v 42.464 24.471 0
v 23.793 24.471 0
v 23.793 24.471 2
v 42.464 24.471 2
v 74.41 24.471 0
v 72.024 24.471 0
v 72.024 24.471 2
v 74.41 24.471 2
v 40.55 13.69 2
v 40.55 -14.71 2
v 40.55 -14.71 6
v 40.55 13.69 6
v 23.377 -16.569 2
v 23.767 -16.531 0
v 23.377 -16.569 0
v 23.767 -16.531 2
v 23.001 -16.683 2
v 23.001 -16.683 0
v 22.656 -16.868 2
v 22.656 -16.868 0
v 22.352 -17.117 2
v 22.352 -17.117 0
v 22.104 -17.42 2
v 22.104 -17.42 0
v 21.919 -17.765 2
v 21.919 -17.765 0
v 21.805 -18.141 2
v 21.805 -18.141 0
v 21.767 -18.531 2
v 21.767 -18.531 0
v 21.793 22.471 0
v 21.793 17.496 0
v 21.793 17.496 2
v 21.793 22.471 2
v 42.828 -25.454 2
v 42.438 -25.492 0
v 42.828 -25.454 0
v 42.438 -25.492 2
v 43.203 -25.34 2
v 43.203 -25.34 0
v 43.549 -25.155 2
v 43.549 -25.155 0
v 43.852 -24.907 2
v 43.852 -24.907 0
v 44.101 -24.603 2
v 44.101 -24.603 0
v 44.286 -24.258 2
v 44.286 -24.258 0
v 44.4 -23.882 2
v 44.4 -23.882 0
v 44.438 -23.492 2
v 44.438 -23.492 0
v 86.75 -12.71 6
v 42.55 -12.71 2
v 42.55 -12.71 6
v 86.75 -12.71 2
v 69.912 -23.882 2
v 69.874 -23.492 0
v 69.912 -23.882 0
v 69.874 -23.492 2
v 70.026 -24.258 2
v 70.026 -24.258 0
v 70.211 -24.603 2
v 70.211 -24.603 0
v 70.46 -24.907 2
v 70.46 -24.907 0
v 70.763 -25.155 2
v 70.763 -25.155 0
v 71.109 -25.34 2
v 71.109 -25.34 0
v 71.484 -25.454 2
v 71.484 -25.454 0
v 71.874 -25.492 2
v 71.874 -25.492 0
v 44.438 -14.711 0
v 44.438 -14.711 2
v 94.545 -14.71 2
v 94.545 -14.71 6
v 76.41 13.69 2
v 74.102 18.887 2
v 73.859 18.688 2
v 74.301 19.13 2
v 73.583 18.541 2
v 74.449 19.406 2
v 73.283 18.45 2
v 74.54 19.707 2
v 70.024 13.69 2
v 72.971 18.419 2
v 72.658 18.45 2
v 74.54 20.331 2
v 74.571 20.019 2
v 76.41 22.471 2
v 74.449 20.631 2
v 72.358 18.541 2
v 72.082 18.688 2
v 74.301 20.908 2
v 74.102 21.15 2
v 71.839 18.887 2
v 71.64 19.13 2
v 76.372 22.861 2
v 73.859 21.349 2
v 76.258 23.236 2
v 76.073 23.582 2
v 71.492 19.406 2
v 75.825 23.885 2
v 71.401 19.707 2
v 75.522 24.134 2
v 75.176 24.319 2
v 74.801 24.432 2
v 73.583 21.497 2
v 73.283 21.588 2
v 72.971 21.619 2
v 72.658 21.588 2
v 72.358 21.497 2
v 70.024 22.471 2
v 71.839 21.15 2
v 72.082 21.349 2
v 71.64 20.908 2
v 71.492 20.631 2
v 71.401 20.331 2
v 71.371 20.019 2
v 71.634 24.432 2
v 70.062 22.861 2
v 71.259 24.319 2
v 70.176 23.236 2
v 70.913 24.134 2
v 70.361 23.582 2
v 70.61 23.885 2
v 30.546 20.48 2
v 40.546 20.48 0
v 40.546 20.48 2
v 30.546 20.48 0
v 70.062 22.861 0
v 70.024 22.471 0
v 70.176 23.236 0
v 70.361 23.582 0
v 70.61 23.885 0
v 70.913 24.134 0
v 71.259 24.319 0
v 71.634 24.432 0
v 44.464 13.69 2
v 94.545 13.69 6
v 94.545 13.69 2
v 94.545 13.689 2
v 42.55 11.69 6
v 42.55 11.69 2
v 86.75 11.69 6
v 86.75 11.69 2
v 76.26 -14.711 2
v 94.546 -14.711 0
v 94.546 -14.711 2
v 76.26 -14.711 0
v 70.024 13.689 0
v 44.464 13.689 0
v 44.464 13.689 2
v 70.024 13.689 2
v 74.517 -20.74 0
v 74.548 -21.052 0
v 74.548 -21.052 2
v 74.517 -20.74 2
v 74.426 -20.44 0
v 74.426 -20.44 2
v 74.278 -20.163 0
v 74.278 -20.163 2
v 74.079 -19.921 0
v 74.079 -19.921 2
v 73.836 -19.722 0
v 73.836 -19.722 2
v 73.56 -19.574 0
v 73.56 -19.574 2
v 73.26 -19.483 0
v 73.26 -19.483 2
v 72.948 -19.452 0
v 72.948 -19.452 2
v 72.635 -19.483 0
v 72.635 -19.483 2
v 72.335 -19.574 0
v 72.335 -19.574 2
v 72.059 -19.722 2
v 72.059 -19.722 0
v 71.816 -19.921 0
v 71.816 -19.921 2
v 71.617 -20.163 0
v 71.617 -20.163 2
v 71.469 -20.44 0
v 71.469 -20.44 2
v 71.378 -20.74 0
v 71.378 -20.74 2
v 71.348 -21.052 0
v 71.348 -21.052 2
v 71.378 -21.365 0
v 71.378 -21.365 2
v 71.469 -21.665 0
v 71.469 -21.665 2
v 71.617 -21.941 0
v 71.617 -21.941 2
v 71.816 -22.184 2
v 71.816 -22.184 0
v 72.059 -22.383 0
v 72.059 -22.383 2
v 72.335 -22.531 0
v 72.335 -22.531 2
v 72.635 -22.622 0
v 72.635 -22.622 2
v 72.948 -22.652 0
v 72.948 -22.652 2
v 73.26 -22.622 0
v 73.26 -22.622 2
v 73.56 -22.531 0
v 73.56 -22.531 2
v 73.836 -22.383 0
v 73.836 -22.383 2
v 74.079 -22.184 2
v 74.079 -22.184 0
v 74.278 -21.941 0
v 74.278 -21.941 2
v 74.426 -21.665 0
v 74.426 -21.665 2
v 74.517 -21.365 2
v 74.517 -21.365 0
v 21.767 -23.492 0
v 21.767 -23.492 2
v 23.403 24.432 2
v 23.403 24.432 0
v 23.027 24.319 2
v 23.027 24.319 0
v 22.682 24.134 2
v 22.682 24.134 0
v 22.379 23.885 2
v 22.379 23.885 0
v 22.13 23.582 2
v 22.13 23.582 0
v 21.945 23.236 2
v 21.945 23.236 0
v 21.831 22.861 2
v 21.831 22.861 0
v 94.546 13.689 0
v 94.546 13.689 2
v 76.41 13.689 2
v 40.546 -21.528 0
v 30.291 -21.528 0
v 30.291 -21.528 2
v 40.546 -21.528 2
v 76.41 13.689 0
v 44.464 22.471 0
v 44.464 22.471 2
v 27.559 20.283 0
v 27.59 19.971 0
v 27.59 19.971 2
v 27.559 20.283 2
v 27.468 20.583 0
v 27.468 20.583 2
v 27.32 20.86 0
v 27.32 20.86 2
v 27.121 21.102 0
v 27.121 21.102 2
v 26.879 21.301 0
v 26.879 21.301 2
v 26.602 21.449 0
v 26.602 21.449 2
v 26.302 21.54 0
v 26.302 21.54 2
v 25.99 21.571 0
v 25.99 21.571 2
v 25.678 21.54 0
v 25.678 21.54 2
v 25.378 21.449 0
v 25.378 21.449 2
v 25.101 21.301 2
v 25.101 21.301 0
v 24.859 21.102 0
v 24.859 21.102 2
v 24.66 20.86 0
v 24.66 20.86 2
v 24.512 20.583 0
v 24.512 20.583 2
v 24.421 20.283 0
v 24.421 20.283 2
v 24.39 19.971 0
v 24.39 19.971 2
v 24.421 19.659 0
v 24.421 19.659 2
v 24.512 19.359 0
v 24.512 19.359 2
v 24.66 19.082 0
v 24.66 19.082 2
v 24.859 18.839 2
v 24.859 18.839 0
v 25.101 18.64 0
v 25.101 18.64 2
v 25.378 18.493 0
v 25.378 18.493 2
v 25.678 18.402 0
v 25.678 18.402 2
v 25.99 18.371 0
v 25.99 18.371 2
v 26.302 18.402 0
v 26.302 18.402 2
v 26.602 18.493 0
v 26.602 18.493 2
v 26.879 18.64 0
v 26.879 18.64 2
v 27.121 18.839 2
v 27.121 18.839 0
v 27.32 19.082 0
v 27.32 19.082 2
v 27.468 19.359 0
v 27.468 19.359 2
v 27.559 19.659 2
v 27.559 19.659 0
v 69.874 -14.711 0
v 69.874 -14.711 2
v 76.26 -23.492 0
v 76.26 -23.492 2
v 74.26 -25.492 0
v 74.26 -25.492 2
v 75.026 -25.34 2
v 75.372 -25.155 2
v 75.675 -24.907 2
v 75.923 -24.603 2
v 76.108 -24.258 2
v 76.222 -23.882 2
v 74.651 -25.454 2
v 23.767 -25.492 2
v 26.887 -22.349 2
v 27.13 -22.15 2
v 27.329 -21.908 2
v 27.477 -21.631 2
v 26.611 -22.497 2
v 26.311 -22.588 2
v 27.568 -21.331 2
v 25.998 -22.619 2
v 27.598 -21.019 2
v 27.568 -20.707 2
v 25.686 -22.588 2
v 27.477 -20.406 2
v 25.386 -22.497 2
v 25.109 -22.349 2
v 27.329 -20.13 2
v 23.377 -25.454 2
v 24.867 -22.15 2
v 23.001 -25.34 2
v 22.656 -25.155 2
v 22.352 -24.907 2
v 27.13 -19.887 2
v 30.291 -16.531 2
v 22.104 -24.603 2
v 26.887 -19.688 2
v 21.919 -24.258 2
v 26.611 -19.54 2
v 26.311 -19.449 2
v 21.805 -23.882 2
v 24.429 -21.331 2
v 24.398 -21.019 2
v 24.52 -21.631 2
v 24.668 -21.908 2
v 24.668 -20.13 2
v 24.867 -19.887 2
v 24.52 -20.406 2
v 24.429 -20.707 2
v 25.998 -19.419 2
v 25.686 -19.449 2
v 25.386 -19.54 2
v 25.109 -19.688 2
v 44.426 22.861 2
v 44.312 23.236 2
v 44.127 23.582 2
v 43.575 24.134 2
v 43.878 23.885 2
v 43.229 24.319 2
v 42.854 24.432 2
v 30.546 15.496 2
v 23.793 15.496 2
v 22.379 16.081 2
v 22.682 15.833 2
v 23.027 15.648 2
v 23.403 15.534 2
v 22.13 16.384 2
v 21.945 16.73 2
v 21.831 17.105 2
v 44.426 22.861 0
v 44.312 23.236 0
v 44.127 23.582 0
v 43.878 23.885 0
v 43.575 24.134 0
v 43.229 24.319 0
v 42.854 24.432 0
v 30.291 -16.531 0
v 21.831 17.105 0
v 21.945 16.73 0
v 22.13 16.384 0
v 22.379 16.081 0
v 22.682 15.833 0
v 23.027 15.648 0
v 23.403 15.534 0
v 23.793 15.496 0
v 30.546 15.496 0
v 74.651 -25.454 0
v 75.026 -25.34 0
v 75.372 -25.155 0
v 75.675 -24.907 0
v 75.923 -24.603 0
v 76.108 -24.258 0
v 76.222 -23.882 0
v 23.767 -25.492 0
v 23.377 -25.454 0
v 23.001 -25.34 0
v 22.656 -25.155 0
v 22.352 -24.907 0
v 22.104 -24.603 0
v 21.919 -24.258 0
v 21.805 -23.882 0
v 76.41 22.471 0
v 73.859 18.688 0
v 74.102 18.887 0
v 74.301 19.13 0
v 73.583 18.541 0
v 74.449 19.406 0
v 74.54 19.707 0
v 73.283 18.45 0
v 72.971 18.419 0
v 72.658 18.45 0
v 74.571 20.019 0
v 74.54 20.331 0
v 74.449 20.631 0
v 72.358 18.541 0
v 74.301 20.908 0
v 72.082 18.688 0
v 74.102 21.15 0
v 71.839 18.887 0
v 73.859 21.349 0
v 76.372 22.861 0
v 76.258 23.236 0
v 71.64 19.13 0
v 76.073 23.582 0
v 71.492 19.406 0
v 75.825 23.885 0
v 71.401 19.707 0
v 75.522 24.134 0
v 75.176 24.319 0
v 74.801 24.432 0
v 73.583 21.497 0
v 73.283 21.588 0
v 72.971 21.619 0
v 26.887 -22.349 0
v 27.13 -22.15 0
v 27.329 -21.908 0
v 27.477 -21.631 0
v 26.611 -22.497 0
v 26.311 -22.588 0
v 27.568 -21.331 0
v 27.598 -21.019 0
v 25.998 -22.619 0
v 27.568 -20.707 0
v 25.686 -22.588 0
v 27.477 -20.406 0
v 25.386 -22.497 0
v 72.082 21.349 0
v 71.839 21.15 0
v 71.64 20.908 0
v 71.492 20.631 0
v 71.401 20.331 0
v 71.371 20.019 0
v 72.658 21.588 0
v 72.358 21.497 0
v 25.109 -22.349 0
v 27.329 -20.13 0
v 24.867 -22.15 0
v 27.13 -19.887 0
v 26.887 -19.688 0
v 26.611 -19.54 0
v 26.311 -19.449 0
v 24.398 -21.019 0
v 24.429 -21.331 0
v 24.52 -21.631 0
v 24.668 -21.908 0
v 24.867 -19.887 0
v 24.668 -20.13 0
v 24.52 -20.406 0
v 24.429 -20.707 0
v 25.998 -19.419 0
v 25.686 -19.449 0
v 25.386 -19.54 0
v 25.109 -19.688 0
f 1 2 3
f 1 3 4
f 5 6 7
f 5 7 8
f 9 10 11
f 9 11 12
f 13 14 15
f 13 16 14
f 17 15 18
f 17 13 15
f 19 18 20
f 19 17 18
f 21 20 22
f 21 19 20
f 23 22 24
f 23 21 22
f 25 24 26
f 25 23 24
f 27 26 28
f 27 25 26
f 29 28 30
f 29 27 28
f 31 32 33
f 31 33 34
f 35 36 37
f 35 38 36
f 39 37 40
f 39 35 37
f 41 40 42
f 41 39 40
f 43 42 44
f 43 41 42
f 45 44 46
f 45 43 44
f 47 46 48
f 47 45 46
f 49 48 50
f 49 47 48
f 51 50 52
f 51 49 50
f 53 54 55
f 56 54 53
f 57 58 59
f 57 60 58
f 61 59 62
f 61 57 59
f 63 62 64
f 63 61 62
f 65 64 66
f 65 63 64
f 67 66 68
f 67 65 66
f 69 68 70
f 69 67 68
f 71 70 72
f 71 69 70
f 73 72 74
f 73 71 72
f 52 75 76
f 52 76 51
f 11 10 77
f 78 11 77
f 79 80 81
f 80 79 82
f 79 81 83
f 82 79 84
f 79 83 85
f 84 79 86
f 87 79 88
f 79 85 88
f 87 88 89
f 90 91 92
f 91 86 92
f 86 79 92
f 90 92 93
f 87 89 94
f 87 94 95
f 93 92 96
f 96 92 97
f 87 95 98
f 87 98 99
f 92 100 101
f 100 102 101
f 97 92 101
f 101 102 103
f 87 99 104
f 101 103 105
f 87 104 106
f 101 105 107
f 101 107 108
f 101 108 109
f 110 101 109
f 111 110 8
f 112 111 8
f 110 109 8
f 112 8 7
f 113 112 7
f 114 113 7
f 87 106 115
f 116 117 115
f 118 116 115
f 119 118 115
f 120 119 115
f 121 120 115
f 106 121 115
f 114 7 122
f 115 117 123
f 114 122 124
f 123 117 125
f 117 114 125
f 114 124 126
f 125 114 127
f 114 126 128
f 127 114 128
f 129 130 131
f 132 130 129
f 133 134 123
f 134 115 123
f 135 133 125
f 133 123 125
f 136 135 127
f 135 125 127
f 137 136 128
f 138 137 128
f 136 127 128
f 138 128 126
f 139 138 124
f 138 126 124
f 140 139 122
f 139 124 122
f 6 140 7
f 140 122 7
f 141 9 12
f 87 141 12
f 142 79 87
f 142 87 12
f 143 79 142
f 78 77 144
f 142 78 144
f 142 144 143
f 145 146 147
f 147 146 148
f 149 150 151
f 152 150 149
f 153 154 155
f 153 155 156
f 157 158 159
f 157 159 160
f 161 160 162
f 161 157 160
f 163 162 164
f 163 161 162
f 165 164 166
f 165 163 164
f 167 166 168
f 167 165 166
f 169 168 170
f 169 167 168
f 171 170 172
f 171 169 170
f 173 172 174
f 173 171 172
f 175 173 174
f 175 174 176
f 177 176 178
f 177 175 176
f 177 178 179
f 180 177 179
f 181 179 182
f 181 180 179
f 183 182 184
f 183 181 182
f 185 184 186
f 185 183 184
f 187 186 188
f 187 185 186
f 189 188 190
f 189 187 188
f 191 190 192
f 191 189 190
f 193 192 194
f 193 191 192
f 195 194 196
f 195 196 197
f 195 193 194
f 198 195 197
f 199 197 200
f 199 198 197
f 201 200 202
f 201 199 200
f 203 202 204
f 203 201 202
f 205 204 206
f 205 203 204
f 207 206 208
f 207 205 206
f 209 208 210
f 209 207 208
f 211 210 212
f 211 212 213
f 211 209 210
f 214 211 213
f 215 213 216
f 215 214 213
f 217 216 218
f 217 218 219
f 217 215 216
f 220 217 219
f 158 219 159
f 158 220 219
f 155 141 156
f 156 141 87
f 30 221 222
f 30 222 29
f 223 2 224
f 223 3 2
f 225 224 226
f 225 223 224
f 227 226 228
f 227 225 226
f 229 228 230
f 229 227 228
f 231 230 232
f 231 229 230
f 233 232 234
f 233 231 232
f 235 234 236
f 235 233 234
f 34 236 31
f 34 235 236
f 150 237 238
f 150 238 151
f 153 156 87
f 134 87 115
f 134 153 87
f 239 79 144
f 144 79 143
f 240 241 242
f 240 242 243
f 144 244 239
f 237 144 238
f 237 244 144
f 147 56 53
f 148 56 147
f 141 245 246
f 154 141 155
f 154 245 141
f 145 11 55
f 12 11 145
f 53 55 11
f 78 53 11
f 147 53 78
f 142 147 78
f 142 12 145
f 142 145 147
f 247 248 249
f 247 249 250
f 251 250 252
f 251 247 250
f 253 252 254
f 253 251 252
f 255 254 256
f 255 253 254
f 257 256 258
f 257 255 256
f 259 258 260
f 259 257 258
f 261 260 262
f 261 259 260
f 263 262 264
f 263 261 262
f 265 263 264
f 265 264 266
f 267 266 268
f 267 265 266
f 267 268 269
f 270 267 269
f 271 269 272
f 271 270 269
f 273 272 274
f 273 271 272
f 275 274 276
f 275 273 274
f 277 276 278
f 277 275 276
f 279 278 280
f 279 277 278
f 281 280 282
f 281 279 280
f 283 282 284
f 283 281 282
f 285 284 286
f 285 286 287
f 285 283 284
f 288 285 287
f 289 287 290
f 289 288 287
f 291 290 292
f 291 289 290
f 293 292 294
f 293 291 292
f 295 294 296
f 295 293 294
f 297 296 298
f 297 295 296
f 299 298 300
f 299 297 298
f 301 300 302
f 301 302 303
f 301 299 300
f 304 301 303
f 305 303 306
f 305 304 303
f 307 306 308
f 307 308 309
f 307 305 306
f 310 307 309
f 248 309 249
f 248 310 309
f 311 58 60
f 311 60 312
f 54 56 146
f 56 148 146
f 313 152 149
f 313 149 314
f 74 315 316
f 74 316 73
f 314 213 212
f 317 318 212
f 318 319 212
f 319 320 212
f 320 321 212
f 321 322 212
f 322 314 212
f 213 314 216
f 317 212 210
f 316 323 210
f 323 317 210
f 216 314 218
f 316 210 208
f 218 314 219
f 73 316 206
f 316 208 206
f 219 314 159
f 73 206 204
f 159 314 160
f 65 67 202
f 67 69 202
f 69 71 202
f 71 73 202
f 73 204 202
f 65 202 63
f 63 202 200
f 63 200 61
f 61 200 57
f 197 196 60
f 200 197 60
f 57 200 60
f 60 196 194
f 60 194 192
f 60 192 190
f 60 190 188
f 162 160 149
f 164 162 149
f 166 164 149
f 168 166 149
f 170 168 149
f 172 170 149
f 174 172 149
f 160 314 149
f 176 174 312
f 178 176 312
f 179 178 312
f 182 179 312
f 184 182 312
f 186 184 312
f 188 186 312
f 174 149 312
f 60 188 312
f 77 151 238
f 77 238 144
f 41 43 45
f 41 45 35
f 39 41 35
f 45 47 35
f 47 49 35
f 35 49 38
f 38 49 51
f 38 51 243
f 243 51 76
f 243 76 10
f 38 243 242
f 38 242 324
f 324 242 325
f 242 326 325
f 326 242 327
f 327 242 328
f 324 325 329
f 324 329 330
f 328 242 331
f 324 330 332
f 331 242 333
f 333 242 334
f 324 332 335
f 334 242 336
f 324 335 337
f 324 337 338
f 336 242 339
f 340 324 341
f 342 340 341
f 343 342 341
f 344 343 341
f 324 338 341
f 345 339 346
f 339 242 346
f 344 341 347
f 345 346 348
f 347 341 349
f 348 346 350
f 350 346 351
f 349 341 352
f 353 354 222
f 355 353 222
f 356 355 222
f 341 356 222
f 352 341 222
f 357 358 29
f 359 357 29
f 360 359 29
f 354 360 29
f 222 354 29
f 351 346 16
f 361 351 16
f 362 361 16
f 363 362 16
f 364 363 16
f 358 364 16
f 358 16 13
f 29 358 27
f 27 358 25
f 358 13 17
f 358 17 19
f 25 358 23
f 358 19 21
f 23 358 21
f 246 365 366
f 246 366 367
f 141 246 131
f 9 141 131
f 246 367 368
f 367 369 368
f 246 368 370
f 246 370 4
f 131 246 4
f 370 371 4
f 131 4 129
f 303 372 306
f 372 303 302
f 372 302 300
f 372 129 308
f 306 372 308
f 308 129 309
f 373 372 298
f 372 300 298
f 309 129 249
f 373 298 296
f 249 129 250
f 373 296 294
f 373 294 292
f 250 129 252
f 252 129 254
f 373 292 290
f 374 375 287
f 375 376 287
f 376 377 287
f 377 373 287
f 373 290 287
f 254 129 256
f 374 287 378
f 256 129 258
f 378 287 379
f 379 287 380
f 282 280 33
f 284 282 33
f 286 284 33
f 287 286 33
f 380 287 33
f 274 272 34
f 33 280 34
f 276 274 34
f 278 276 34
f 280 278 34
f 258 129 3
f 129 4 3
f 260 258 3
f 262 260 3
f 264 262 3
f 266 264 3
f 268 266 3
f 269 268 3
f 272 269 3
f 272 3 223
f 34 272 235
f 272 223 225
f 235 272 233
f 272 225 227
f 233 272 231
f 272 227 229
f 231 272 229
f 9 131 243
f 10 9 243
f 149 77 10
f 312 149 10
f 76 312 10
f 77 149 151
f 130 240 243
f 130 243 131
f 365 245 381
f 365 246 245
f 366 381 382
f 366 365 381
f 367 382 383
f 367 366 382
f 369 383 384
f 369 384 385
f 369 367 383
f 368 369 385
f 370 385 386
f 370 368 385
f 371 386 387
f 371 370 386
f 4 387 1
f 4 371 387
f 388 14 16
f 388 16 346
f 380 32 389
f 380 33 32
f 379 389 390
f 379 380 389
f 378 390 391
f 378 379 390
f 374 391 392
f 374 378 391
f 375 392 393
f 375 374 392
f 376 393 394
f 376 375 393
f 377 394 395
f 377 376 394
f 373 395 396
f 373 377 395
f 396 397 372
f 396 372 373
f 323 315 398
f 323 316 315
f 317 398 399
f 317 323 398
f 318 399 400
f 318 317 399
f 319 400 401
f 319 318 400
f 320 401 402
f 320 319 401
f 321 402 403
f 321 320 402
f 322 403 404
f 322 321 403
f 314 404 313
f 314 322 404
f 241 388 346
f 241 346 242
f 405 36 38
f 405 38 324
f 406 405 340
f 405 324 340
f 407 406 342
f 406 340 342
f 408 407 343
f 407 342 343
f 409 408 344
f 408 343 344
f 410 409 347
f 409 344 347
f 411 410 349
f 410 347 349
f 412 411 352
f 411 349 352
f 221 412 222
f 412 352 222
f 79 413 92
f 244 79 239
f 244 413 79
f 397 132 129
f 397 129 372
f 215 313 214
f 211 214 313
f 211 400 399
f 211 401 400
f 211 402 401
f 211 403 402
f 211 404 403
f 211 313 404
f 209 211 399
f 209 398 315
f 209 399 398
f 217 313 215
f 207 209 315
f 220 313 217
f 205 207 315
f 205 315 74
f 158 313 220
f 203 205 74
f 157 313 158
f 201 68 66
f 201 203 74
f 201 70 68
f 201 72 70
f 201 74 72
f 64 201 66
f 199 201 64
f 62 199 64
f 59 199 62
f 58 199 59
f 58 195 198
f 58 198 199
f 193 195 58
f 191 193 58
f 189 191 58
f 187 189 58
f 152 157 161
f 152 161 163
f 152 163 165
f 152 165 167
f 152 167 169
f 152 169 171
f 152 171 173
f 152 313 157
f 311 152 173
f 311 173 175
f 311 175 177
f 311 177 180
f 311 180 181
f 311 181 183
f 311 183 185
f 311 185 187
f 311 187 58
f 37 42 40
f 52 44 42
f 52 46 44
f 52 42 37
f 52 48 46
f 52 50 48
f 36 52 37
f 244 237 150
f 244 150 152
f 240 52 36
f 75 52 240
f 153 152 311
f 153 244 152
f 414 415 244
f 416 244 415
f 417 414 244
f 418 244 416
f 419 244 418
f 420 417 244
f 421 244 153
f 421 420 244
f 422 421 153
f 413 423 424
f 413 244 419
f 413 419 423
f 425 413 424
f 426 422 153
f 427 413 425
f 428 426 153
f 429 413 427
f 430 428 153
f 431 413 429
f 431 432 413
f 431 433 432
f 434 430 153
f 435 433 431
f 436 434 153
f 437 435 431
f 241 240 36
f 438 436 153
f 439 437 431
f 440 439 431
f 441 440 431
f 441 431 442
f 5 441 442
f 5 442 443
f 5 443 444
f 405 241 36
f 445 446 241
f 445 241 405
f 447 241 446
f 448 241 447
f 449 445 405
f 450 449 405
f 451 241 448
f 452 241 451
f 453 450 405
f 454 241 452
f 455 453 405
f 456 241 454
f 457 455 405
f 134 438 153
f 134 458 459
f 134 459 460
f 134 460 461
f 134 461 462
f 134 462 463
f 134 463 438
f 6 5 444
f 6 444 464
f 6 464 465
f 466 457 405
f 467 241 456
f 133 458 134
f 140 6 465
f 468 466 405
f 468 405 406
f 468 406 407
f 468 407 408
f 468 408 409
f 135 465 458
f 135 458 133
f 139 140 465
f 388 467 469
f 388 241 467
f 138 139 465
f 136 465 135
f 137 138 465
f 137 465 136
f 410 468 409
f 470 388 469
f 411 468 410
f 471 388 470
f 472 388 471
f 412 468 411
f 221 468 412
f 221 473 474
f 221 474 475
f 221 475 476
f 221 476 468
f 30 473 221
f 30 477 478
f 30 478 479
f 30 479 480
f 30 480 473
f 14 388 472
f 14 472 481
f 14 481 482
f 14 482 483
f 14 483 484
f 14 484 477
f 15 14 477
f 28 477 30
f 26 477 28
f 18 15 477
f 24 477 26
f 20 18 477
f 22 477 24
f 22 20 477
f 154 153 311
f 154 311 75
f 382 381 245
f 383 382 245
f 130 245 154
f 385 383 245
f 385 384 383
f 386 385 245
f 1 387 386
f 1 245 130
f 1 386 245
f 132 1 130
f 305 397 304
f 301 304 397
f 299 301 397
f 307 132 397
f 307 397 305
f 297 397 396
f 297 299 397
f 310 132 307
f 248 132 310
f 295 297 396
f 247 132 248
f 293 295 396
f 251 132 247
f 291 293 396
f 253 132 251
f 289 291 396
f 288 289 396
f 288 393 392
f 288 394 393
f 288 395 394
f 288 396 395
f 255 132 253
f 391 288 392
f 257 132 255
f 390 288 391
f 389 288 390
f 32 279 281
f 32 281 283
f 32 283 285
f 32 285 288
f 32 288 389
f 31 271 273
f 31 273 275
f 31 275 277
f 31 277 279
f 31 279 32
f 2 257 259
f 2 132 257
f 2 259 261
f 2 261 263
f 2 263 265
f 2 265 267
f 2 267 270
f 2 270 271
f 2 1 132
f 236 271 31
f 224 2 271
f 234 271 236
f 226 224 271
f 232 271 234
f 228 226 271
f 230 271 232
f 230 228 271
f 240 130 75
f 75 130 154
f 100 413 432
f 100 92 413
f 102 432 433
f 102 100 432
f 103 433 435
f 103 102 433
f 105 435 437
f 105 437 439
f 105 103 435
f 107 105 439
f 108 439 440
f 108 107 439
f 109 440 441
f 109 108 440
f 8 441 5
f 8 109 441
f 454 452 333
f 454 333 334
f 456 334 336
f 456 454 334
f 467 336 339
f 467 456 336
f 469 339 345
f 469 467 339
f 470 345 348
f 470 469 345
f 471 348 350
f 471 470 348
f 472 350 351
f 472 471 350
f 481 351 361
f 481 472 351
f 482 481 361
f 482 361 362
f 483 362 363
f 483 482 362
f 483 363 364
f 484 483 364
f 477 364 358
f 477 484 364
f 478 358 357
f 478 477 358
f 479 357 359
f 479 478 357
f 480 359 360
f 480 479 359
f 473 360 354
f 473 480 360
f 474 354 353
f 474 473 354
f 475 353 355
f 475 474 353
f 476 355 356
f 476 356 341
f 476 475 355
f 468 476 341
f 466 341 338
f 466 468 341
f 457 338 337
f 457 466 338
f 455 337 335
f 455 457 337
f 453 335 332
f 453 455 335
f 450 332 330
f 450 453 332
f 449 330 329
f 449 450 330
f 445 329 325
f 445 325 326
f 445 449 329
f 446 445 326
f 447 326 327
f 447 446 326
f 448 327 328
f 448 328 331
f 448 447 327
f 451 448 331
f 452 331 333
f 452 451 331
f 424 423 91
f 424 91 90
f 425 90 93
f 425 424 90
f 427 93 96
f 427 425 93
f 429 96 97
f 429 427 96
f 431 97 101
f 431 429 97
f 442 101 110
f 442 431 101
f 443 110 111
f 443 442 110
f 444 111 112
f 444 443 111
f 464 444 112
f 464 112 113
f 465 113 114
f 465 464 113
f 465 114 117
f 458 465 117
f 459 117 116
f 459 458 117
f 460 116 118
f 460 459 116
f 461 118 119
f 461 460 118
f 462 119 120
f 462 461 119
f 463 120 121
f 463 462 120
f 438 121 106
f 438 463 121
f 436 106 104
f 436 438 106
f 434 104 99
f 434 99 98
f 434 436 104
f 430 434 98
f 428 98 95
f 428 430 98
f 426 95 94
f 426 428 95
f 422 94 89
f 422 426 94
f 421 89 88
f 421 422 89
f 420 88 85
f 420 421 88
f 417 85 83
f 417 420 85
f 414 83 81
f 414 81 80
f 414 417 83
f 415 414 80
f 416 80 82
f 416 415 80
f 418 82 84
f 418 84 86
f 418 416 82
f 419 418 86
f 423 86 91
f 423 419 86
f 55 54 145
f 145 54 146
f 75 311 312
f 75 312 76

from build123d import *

# Parameters (mm, degrees)
SKETCH_R      = 1.6
PAD_DEPTH     = 2
SKETCH001_W   = 53.9946
SKETCH001_H   = 28.4007
SKETCH001_W_2 = 44.2
SKETCH001_H_2 = 24.4007
PAD001_DEPTH  = 4
FILLET_R      = 2


with BuildPart() as part:
    # Sketch → Pad (new body)
    with BuildSketch(Plane.XY):
        Polygon((21.7667, -25.4923), (21.7667, -16.53082), (30.29072, -16.53082), (30.29072, -21.52783), (40.54589, -21.52783), (40.54589, 20.48012), (30.54589, 20.48012), (30.54589, 15.49558), (21.7928, 15.49558), (21.7928, 24.4708), (44.46409, 24.4708), (44.46409, 13.68925), (70.02404, 13.68925), (70.02404, 24.4708), (76.4105, 24.4708), (76.4105, 13.68925), (94.54589, 13.68925), (94.54589, -14.71075), (76.26045, -14.71075), (76.26045, -25.4923), (69.87399, -25.4923), (69.87399, -14.71075), (44.43799, -14.71075), (44.43799, -25.4923), align=None)
        with Locations((25.98991, 19.9708)):
            Circle(SKETCH_R, mode=Mode.SUBTRACT)
        with Locations((25.99838, -21.01867)):
            Circle(SKETCH_R, mode=Mode.SUBTRACT)
        with Locations((72.97054, 20.01877)):
            Circle(SKETCH_R, mode=Mode.SUBTRACT)
        with Locations((72.94754, -21.05239)):
            Circle(SKETCH_R, mode=Mode.SUBTRACT)
    extrude(amount=PAD_DEPTH)

    # Sketch001 → Pad001 (new body)
    with BuildSketch(Plane.XY.offset(2)):
        with Locations((67.5478, -0.51015)):
            Rectangle(SKETCH001_W, SKETCH001_H)
        with Locations((64.6505, -0.51015)):
            Rectangle(SKETCH001_W_2, SKETCH001_H_2, mode=Mode.SUBTRACT)
    extrude(amount=PAD001_DEPTH)

    # Fillet
    fillet_edges = [part.edges().sort_by_distance(p)[0] for p in [
        (21.7667, -16.53082, 1),
        (21.7667, -25.4923, 1),
        (44.43799, -25.4923, 1),
        (69.87399, -25.4923, 1),
        (76.26045, -25.4923, 1),
        (76.4105, 24.4708, 1),
        (70.02404, 24.4708, 1),
        (44.46409, 24.4708, 1),
        (21.7928, 24.4708, 1),
        (21.7928, 15.49558, 1),
    ]]
    fillet(fillet_edges, radius=FILLET_R)


solid = part.part
